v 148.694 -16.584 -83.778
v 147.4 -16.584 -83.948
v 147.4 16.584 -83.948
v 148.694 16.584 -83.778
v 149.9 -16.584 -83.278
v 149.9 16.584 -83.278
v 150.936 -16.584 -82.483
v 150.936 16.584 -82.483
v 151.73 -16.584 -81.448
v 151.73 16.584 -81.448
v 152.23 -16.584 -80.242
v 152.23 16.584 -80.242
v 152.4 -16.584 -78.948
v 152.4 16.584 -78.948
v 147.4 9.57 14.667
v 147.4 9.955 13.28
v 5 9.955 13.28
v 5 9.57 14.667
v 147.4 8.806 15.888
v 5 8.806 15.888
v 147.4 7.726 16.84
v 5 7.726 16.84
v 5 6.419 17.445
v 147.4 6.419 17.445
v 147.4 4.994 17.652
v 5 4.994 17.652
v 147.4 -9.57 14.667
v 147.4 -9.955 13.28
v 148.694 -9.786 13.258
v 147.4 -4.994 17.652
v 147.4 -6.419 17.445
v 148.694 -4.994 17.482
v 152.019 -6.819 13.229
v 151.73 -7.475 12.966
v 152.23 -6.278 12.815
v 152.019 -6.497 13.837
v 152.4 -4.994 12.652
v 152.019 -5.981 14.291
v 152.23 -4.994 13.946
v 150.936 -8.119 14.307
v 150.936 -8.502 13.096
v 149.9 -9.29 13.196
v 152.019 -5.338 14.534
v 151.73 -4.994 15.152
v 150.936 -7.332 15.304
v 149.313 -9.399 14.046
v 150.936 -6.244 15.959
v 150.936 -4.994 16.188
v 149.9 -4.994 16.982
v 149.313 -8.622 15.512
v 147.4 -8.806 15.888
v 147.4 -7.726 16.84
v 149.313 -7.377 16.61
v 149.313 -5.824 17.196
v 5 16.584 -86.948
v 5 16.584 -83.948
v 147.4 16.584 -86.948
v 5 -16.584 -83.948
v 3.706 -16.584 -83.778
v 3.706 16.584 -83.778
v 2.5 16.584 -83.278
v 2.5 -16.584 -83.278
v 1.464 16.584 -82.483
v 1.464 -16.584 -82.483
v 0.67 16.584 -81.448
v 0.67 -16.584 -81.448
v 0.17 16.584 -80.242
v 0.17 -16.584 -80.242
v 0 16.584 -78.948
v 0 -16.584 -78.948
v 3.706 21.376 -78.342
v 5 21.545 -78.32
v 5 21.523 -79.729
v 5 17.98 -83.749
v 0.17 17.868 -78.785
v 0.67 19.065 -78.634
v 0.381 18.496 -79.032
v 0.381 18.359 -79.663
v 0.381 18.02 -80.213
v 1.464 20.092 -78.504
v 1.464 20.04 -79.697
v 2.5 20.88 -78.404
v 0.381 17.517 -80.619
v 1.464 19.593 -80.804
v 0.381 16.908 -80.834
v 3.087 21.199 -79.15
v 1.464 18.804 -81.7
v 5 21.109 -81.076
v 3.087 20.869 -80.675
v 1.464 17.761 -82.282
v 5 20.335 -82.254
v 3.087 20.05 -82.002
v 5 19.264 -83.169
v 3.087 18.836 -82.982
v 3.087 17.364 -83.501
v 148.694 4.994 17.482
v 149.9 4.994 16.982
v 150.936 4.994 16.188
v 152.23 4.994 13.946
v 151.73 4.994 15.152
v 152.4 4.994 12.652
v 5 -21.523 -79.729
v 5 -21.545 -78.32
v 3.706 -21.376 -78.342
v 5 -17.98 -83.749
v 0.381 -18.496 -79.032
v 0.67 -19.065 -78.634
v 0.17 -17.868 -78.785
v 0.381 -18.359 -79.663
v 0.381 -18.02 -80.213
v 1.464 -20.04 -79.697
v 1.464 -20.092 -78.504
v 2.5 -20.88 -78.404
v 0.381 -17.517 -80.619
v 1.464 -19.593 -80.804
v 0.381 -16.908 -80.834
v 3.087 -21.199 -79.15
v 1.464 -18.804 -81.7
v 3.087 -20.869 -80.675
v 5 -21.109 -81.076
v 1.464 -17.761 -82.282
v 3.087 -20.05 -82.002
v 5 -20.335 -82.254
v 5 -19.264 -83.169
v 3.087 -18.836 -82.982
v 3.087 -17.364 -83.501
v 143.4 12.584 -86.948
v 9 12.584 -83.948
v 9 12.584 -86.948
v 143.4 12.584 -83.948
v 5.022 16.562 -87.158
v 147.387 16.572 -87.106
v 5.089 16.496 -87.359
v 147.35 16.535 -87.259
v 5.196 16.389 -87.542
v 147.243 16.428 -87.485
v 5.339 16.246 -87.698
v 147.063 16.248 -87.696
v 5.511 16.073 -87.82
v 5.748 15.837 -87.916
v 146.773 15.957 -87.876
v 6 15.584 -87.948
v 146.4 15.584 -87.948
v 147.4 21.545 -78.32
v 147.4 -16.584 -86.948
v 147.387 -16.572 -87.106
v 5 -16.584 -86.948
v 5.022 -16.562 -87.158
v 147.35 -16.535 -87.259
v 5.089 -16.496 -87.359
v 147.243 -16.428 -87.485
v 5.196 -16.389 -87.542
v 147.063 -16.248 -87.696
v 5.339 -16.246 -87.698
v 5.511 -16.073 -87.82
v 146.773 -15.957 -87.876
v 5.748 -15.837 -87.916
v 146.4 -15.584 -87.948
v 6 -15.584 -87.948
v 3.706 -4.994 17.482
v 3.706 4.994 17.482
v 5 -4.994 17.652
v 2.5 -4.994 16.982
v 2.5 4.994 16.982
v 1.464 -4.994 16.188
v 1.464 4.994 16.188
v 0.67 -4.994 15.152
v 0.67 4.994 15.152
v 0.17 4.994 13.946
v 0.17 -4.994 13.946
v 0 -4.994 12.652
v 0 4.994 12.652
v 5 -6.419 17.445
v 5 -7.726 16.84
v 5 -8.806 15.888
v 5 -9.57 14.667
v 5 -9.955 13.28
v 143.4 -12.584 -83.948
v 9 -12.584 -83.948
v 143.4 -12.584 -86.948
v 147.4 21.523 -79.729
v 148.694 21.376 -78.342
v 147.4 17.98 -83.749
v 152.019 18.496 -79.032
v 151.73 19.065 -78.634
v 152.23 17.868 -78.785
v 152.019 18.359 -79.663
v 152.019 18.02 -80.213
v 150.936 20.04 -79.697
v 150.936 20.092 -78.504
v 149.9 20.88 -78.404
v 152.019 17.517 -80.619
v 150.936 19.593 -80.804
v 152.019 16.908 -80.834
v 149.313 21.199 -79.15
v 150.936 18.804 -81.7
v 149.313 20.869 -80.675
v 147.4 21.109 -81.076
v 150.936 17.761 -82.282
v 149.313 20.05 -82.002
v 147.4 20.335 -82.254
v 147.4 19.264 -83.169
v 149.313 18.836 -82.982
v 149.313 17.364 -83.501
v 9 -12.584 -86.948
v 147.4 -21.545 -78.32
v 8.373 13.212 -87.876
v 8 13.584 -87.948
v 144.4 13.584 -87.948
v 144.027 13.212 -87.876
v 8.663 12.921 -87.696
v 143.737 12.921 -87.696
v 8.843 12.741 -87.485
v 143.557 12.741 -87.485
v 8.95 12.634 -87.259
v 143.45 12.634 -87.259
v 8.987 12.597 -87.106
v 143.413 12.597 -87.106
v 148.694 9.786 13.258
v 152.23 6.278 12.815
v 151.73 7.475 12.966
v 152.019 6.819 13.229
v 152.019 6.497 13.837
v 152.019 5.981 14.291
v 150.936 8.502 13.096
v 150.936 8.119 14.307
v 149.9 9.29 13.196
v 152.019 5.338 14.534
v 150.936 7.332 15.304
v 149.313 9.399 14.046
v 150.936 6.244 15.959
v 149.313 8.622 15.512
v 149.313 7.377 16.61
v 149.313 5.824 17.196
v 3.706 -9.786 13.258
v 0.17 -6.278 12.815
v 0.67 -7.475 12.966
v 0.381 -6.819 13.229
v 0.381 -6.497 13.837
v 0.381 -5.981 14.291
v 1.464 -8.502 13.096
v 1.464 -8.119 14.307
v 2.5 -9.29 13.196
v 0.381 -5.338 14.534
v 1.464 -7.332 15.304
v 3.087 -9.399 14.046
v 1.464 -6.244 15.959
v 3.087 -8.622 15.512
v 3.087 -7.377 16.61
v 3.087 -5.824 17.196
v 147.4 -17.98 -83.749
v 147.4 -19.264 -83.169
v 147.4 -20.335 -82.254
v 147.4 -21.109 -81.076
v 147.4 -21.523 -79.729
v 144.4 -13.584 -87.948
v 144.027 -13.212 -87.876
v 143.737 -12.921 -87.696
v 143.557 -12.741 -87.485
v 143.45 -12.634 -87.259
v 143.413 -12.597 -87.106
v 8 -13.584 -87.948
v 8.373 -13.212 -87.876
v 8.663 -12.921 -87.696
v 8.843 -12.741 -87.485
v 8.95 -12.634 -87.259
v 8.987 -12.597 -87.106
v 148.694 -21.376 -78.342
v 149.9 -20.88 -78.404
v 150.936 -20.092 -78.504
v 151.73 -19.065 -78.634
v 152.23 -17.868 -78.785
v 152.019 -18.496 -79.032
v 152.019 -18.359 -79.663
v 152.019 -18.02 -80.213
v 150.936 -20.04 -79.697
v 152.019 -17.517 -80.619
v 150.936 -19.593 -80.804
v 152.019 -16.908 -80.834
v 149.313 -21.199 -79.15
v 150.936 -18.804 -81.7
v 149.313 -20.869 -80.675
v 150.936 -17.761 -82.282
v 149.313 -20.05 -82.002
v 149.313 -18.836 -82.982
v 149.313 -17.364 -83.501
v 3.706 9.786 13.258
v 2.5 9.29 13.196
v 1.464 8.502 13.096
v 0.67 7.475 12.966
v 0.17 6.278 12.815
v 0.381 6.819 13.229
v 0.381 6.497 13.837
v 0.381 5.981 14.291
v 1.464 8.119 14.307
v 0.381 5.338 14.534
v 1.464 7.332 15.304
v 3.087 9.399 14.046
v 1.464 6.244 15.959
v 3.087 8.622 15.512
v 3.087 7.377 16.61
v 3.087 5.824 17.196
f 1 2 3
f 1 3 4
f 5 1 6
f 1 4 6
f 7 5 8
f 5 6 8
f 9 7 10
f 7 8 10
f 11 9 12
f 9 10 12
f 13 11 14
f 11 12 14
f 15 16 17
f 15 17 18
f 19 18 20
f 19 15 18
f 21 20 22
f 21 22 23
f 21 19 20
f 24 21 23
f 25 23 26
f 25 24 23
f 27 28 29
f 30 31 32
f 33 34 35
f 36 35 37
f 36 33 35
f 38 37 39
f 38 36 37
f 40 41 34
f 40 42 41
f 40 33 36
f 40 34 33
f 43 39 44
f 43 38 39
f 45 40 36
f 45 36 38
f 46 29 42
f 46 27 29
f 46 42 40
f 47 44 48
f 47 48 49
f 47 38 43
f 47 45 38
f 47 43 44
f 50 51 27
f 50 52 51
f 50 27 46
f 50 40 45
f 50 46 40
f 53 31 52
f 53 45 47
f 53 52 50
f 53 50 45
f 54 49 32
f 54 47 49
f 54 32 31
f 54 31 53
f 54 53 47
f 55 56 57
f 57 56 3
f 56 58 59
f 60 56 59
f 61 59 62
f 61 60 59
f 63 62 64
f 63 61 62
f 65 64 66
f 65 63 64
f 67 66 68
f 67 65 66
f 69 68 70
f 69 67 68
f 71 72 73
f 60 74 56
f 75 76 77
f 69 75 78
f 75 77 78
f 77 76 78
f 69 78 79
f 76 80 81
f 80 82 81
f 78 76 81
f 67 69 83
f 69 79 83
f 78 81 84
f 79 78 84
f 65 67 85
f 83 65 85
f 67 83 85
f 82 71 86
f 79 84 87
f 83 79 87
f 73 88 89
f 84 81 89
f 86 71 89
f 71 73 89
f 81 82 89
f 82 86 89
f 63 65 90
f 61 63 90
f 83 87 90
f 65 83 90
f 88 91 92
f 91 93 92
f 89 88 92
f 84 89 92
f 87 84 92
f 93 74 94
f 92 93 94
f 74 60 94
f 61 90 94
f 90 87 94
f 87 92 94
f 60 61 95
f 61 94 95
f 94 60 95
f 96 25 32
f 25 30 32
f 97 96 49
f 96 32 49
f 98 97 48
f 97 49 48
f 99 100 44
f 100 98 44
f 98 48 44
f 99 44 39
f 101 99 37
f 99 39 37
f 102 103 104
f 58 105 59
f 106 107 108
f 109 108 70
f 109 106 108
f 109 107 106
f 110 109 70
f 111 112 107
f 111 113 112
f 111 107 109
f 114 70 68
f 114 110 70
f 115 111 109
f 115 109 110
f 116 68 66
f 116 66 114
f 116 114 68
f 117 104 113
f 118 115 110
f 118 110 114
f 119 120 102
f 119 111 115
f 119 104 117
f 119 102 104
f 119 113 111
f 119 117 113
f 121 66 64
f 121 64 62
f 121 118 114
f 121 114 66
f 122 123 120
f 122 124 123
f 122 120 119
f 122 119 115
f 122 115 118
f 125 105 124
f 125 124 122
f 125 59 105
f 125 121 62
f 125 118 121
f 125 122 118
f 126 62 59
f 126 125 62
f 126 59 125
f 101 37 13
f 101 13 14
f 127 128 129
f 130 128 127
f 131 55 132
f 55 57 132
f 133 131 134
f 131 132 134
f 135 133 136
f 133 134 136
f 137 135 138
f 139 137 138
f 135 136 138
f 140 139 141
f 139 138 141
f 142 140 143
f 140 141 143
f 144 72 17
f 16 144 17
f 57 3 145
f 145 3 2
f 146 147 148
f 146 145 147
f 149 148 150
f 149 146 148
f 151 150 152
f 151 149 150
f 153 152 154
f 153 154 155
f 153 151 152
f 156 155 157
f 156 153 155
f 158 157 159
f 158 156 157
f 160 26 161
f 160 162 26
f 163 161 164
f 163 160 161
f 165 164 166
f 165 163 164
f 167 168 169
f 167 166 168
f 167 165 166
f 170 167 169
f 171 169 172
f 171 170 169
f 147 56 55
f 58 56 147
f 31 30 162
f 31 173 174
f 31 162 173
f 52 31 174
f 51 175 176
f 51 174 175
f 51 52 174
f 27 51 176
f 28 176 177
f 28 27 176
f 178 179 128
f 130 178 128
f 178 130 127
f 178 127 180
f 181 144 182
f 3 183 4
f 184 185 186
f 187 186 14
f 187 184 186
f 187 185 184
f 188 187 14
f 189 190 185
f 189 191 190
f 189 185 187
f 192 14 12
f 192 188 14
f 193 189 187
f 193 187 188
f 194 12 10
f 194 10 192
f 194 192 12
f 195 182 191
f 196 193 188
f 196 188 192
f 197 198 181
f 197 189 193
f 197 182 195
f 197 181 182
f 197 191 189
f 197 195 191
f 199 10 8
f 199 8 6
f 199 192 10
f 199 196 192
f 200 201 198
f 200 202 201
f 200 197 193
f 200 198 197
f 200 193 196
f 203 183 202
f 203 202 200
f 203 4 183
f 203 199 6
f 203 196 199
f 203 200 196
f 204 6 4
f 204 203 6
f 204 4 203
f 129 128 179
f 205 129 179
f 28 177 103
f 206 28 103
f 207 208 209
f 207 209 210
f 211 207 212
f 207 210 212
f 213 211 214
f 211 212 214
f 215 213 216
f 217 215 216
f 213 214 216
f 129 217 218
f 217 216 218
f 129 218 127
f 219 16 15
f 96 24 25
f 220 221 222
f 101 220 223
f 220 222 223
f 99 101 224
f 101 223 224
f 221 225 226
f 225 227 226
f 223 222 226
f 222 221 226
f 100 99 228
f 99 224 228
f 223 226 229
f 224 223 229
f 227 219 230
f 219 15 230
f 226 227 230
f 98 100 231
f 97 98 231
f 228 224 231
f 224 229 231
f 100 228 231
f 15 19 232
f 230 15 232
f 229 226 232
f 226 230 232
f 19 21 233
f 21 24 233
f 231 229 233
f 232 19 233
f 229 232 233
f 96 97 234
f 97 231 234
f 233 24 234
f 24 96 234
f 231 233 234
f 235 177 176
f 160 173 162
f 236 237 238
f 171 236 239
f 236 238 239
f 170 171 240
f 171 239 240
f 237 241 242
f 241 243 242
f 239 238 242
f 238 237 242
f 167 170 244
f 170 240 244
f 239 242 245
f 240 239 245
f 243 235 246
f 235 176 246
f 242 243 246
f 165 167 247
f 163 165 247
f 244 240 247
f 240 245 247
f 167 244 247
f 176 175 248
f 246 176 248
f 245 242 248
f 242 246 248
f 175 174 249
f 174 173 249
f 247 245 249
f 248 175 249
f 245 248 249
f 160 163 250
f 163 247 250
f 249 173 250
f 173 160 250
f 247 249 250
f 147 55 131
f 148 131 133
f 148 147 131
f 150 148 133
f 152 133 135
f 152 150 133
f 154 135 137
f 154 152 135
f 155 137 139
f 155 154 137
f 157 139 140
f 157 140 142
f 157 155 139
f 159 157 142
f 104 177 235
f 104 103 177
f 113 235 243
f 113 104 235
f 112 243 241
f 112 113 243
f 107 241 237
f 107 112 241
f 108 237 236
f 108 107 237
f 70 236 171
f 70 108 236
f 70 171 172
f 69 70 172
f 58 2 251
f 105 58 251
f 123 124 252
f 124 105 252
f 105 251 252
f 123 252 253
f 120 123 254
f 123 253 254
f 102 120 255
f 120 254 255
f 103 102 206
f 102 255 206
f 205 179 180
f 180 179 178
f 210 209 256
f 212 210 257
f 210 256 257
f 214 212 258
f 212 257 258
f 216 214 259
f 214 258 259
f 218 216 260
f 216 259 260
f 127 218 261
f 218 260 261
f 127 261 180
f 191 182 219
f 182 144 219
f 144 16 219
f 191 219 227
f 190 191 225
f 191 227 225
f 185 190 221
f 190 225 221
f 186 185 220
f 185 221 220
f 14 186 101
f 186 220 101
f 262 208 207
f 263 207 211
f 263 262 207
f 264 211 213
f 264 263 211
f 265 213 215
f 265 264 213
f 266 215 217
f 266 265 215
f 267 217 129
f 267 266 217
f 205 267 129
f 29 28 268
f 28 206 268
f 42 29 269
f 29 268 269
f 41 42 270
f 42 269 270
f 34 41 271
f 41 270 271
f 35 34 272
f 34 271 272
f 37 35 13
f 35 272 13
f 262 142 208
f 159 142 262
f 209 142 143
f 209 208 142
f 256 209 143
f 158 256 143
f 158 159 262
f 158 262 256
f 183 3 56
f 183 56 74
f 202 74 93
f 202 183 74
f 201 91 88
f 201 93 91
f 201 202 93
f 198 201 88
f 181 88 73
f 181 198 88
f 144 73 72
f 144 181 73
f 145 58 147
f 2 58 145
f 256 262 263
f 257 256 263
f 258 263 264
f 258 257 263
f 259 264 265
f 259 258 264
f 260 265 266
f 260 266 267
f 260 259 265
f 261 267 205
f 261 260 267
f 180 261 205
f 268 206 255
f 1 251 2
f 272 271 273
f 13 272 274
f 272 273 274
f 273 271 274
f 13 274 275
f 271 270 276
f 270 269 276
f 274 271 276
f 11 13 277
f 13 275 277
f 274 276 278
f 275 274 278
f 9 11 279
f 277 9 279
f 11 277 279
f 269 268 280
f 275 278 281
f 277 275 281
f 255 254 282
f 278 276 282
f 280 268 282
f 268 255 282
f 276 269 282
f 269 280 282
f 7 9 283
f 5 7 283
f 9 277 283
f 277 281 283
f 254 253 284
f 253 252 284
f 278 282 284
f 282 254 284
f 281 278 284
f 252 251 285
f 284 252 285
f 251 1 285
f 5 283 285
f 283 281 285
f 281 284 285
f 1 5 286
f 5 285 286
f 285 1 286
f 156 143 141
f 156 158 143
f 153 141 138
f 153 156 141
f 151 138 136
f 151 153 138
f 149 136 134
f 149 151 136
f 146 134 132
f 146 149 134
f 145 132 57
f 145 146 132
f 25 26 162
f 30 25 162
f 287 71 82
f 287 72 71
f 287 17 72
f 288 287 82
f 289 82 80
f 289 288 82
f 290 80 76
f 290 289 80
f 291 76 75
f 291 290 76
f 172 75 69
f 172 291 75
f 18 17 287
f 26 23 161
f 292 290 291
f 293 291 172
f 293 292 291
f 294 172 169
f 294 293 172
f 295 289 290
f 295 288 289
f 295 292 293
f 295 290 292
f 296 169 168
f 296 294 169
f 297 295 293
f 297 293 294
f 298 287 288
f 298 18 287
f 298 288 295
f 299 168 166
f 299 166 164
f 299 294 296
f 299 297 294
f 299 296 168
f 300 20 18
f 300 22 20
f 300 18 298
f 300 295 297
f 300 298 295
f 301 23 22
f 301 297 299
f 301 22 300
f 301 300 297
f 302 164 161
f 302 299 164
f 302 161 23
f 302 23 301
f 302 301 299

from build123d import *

# Parameters (mm, degrees)
F1_DEPTH = 152.4
F2_R     = 5
F3_W     = 142.4
F3_H     = 33.168938
F3_W_2   = 134.4
F3_H_2   = 25.168938
F4_DEPTH = 4
F5_R     = 1


with BuildPart() as f1:
    # F0 (on Right) → F1 (new body)
    with BuildSketch(Plane.YZ):
        Polygon((-22.256978, -83.947913), (0, -83.947913), (22.256978, -83.947913), (9.401655, 17.652087), (0, 17.652087), (-9.401655, 17.652087), align=None)
    extrude(amount=F1_DEPTH)

    # F2
    f2_edges = [f1.edges().sort_by_distance(p)[0] for p in [
        (76.2, 22.256978, -83.947913),
        (76.2, 9.401655, 17.652087),
        (0, 15.829316, -33.147913),
        (152.4, 15.829316, -33.147913),
        (76.2, -9.401655, 17.652087),
        (76.2, -22.256978, -83.947913),
        (0, -15.829316, -33.147913),
        (152.4, -15.829316, -33.147913),
        (152.4, 0, 17.652087),
        (0, 0, 17.652087),
        (152.4, 0, -83.947913),
        (0, 0, -83.947913),
    ]]
    fillet(f2_edges, radius=F2_R)

    # F3 (on face) → F4 (join)
    with BuildSketch(Plane(origin=(0, 0, -83.947913), x_dir=(1, 0, 0), z_dir=(0, 0, -1))):
        with Locations((76.2, 0)):
            Rectangle(F3_W, F3_H)
        with Locations((76.2, 0)):
            Rectangle(F3_W_2, F3_H_2, mode=Mode.SUBTRACT)
    extrude(amount=F4_DEPTH)

    # F5
    f5_edges = [f1.edges().sort_by_distance(p)[0] for p in [
        (147.4, 0, -87.947913),
        (76.2, -16.584469, -87.947913),
        (5, 0, -87.947913),
        (76.2, 16.584469, -87.947913),
        (9, 0, -87.947913),
        (76.2, -12.584469, -87.947913),
        (143.4, 0, -87.947913),
        (76.2, 12.584469, -87.947913),
    ]]
    fillet(f5_edges, radius=F5_R)


solid = f1.part
